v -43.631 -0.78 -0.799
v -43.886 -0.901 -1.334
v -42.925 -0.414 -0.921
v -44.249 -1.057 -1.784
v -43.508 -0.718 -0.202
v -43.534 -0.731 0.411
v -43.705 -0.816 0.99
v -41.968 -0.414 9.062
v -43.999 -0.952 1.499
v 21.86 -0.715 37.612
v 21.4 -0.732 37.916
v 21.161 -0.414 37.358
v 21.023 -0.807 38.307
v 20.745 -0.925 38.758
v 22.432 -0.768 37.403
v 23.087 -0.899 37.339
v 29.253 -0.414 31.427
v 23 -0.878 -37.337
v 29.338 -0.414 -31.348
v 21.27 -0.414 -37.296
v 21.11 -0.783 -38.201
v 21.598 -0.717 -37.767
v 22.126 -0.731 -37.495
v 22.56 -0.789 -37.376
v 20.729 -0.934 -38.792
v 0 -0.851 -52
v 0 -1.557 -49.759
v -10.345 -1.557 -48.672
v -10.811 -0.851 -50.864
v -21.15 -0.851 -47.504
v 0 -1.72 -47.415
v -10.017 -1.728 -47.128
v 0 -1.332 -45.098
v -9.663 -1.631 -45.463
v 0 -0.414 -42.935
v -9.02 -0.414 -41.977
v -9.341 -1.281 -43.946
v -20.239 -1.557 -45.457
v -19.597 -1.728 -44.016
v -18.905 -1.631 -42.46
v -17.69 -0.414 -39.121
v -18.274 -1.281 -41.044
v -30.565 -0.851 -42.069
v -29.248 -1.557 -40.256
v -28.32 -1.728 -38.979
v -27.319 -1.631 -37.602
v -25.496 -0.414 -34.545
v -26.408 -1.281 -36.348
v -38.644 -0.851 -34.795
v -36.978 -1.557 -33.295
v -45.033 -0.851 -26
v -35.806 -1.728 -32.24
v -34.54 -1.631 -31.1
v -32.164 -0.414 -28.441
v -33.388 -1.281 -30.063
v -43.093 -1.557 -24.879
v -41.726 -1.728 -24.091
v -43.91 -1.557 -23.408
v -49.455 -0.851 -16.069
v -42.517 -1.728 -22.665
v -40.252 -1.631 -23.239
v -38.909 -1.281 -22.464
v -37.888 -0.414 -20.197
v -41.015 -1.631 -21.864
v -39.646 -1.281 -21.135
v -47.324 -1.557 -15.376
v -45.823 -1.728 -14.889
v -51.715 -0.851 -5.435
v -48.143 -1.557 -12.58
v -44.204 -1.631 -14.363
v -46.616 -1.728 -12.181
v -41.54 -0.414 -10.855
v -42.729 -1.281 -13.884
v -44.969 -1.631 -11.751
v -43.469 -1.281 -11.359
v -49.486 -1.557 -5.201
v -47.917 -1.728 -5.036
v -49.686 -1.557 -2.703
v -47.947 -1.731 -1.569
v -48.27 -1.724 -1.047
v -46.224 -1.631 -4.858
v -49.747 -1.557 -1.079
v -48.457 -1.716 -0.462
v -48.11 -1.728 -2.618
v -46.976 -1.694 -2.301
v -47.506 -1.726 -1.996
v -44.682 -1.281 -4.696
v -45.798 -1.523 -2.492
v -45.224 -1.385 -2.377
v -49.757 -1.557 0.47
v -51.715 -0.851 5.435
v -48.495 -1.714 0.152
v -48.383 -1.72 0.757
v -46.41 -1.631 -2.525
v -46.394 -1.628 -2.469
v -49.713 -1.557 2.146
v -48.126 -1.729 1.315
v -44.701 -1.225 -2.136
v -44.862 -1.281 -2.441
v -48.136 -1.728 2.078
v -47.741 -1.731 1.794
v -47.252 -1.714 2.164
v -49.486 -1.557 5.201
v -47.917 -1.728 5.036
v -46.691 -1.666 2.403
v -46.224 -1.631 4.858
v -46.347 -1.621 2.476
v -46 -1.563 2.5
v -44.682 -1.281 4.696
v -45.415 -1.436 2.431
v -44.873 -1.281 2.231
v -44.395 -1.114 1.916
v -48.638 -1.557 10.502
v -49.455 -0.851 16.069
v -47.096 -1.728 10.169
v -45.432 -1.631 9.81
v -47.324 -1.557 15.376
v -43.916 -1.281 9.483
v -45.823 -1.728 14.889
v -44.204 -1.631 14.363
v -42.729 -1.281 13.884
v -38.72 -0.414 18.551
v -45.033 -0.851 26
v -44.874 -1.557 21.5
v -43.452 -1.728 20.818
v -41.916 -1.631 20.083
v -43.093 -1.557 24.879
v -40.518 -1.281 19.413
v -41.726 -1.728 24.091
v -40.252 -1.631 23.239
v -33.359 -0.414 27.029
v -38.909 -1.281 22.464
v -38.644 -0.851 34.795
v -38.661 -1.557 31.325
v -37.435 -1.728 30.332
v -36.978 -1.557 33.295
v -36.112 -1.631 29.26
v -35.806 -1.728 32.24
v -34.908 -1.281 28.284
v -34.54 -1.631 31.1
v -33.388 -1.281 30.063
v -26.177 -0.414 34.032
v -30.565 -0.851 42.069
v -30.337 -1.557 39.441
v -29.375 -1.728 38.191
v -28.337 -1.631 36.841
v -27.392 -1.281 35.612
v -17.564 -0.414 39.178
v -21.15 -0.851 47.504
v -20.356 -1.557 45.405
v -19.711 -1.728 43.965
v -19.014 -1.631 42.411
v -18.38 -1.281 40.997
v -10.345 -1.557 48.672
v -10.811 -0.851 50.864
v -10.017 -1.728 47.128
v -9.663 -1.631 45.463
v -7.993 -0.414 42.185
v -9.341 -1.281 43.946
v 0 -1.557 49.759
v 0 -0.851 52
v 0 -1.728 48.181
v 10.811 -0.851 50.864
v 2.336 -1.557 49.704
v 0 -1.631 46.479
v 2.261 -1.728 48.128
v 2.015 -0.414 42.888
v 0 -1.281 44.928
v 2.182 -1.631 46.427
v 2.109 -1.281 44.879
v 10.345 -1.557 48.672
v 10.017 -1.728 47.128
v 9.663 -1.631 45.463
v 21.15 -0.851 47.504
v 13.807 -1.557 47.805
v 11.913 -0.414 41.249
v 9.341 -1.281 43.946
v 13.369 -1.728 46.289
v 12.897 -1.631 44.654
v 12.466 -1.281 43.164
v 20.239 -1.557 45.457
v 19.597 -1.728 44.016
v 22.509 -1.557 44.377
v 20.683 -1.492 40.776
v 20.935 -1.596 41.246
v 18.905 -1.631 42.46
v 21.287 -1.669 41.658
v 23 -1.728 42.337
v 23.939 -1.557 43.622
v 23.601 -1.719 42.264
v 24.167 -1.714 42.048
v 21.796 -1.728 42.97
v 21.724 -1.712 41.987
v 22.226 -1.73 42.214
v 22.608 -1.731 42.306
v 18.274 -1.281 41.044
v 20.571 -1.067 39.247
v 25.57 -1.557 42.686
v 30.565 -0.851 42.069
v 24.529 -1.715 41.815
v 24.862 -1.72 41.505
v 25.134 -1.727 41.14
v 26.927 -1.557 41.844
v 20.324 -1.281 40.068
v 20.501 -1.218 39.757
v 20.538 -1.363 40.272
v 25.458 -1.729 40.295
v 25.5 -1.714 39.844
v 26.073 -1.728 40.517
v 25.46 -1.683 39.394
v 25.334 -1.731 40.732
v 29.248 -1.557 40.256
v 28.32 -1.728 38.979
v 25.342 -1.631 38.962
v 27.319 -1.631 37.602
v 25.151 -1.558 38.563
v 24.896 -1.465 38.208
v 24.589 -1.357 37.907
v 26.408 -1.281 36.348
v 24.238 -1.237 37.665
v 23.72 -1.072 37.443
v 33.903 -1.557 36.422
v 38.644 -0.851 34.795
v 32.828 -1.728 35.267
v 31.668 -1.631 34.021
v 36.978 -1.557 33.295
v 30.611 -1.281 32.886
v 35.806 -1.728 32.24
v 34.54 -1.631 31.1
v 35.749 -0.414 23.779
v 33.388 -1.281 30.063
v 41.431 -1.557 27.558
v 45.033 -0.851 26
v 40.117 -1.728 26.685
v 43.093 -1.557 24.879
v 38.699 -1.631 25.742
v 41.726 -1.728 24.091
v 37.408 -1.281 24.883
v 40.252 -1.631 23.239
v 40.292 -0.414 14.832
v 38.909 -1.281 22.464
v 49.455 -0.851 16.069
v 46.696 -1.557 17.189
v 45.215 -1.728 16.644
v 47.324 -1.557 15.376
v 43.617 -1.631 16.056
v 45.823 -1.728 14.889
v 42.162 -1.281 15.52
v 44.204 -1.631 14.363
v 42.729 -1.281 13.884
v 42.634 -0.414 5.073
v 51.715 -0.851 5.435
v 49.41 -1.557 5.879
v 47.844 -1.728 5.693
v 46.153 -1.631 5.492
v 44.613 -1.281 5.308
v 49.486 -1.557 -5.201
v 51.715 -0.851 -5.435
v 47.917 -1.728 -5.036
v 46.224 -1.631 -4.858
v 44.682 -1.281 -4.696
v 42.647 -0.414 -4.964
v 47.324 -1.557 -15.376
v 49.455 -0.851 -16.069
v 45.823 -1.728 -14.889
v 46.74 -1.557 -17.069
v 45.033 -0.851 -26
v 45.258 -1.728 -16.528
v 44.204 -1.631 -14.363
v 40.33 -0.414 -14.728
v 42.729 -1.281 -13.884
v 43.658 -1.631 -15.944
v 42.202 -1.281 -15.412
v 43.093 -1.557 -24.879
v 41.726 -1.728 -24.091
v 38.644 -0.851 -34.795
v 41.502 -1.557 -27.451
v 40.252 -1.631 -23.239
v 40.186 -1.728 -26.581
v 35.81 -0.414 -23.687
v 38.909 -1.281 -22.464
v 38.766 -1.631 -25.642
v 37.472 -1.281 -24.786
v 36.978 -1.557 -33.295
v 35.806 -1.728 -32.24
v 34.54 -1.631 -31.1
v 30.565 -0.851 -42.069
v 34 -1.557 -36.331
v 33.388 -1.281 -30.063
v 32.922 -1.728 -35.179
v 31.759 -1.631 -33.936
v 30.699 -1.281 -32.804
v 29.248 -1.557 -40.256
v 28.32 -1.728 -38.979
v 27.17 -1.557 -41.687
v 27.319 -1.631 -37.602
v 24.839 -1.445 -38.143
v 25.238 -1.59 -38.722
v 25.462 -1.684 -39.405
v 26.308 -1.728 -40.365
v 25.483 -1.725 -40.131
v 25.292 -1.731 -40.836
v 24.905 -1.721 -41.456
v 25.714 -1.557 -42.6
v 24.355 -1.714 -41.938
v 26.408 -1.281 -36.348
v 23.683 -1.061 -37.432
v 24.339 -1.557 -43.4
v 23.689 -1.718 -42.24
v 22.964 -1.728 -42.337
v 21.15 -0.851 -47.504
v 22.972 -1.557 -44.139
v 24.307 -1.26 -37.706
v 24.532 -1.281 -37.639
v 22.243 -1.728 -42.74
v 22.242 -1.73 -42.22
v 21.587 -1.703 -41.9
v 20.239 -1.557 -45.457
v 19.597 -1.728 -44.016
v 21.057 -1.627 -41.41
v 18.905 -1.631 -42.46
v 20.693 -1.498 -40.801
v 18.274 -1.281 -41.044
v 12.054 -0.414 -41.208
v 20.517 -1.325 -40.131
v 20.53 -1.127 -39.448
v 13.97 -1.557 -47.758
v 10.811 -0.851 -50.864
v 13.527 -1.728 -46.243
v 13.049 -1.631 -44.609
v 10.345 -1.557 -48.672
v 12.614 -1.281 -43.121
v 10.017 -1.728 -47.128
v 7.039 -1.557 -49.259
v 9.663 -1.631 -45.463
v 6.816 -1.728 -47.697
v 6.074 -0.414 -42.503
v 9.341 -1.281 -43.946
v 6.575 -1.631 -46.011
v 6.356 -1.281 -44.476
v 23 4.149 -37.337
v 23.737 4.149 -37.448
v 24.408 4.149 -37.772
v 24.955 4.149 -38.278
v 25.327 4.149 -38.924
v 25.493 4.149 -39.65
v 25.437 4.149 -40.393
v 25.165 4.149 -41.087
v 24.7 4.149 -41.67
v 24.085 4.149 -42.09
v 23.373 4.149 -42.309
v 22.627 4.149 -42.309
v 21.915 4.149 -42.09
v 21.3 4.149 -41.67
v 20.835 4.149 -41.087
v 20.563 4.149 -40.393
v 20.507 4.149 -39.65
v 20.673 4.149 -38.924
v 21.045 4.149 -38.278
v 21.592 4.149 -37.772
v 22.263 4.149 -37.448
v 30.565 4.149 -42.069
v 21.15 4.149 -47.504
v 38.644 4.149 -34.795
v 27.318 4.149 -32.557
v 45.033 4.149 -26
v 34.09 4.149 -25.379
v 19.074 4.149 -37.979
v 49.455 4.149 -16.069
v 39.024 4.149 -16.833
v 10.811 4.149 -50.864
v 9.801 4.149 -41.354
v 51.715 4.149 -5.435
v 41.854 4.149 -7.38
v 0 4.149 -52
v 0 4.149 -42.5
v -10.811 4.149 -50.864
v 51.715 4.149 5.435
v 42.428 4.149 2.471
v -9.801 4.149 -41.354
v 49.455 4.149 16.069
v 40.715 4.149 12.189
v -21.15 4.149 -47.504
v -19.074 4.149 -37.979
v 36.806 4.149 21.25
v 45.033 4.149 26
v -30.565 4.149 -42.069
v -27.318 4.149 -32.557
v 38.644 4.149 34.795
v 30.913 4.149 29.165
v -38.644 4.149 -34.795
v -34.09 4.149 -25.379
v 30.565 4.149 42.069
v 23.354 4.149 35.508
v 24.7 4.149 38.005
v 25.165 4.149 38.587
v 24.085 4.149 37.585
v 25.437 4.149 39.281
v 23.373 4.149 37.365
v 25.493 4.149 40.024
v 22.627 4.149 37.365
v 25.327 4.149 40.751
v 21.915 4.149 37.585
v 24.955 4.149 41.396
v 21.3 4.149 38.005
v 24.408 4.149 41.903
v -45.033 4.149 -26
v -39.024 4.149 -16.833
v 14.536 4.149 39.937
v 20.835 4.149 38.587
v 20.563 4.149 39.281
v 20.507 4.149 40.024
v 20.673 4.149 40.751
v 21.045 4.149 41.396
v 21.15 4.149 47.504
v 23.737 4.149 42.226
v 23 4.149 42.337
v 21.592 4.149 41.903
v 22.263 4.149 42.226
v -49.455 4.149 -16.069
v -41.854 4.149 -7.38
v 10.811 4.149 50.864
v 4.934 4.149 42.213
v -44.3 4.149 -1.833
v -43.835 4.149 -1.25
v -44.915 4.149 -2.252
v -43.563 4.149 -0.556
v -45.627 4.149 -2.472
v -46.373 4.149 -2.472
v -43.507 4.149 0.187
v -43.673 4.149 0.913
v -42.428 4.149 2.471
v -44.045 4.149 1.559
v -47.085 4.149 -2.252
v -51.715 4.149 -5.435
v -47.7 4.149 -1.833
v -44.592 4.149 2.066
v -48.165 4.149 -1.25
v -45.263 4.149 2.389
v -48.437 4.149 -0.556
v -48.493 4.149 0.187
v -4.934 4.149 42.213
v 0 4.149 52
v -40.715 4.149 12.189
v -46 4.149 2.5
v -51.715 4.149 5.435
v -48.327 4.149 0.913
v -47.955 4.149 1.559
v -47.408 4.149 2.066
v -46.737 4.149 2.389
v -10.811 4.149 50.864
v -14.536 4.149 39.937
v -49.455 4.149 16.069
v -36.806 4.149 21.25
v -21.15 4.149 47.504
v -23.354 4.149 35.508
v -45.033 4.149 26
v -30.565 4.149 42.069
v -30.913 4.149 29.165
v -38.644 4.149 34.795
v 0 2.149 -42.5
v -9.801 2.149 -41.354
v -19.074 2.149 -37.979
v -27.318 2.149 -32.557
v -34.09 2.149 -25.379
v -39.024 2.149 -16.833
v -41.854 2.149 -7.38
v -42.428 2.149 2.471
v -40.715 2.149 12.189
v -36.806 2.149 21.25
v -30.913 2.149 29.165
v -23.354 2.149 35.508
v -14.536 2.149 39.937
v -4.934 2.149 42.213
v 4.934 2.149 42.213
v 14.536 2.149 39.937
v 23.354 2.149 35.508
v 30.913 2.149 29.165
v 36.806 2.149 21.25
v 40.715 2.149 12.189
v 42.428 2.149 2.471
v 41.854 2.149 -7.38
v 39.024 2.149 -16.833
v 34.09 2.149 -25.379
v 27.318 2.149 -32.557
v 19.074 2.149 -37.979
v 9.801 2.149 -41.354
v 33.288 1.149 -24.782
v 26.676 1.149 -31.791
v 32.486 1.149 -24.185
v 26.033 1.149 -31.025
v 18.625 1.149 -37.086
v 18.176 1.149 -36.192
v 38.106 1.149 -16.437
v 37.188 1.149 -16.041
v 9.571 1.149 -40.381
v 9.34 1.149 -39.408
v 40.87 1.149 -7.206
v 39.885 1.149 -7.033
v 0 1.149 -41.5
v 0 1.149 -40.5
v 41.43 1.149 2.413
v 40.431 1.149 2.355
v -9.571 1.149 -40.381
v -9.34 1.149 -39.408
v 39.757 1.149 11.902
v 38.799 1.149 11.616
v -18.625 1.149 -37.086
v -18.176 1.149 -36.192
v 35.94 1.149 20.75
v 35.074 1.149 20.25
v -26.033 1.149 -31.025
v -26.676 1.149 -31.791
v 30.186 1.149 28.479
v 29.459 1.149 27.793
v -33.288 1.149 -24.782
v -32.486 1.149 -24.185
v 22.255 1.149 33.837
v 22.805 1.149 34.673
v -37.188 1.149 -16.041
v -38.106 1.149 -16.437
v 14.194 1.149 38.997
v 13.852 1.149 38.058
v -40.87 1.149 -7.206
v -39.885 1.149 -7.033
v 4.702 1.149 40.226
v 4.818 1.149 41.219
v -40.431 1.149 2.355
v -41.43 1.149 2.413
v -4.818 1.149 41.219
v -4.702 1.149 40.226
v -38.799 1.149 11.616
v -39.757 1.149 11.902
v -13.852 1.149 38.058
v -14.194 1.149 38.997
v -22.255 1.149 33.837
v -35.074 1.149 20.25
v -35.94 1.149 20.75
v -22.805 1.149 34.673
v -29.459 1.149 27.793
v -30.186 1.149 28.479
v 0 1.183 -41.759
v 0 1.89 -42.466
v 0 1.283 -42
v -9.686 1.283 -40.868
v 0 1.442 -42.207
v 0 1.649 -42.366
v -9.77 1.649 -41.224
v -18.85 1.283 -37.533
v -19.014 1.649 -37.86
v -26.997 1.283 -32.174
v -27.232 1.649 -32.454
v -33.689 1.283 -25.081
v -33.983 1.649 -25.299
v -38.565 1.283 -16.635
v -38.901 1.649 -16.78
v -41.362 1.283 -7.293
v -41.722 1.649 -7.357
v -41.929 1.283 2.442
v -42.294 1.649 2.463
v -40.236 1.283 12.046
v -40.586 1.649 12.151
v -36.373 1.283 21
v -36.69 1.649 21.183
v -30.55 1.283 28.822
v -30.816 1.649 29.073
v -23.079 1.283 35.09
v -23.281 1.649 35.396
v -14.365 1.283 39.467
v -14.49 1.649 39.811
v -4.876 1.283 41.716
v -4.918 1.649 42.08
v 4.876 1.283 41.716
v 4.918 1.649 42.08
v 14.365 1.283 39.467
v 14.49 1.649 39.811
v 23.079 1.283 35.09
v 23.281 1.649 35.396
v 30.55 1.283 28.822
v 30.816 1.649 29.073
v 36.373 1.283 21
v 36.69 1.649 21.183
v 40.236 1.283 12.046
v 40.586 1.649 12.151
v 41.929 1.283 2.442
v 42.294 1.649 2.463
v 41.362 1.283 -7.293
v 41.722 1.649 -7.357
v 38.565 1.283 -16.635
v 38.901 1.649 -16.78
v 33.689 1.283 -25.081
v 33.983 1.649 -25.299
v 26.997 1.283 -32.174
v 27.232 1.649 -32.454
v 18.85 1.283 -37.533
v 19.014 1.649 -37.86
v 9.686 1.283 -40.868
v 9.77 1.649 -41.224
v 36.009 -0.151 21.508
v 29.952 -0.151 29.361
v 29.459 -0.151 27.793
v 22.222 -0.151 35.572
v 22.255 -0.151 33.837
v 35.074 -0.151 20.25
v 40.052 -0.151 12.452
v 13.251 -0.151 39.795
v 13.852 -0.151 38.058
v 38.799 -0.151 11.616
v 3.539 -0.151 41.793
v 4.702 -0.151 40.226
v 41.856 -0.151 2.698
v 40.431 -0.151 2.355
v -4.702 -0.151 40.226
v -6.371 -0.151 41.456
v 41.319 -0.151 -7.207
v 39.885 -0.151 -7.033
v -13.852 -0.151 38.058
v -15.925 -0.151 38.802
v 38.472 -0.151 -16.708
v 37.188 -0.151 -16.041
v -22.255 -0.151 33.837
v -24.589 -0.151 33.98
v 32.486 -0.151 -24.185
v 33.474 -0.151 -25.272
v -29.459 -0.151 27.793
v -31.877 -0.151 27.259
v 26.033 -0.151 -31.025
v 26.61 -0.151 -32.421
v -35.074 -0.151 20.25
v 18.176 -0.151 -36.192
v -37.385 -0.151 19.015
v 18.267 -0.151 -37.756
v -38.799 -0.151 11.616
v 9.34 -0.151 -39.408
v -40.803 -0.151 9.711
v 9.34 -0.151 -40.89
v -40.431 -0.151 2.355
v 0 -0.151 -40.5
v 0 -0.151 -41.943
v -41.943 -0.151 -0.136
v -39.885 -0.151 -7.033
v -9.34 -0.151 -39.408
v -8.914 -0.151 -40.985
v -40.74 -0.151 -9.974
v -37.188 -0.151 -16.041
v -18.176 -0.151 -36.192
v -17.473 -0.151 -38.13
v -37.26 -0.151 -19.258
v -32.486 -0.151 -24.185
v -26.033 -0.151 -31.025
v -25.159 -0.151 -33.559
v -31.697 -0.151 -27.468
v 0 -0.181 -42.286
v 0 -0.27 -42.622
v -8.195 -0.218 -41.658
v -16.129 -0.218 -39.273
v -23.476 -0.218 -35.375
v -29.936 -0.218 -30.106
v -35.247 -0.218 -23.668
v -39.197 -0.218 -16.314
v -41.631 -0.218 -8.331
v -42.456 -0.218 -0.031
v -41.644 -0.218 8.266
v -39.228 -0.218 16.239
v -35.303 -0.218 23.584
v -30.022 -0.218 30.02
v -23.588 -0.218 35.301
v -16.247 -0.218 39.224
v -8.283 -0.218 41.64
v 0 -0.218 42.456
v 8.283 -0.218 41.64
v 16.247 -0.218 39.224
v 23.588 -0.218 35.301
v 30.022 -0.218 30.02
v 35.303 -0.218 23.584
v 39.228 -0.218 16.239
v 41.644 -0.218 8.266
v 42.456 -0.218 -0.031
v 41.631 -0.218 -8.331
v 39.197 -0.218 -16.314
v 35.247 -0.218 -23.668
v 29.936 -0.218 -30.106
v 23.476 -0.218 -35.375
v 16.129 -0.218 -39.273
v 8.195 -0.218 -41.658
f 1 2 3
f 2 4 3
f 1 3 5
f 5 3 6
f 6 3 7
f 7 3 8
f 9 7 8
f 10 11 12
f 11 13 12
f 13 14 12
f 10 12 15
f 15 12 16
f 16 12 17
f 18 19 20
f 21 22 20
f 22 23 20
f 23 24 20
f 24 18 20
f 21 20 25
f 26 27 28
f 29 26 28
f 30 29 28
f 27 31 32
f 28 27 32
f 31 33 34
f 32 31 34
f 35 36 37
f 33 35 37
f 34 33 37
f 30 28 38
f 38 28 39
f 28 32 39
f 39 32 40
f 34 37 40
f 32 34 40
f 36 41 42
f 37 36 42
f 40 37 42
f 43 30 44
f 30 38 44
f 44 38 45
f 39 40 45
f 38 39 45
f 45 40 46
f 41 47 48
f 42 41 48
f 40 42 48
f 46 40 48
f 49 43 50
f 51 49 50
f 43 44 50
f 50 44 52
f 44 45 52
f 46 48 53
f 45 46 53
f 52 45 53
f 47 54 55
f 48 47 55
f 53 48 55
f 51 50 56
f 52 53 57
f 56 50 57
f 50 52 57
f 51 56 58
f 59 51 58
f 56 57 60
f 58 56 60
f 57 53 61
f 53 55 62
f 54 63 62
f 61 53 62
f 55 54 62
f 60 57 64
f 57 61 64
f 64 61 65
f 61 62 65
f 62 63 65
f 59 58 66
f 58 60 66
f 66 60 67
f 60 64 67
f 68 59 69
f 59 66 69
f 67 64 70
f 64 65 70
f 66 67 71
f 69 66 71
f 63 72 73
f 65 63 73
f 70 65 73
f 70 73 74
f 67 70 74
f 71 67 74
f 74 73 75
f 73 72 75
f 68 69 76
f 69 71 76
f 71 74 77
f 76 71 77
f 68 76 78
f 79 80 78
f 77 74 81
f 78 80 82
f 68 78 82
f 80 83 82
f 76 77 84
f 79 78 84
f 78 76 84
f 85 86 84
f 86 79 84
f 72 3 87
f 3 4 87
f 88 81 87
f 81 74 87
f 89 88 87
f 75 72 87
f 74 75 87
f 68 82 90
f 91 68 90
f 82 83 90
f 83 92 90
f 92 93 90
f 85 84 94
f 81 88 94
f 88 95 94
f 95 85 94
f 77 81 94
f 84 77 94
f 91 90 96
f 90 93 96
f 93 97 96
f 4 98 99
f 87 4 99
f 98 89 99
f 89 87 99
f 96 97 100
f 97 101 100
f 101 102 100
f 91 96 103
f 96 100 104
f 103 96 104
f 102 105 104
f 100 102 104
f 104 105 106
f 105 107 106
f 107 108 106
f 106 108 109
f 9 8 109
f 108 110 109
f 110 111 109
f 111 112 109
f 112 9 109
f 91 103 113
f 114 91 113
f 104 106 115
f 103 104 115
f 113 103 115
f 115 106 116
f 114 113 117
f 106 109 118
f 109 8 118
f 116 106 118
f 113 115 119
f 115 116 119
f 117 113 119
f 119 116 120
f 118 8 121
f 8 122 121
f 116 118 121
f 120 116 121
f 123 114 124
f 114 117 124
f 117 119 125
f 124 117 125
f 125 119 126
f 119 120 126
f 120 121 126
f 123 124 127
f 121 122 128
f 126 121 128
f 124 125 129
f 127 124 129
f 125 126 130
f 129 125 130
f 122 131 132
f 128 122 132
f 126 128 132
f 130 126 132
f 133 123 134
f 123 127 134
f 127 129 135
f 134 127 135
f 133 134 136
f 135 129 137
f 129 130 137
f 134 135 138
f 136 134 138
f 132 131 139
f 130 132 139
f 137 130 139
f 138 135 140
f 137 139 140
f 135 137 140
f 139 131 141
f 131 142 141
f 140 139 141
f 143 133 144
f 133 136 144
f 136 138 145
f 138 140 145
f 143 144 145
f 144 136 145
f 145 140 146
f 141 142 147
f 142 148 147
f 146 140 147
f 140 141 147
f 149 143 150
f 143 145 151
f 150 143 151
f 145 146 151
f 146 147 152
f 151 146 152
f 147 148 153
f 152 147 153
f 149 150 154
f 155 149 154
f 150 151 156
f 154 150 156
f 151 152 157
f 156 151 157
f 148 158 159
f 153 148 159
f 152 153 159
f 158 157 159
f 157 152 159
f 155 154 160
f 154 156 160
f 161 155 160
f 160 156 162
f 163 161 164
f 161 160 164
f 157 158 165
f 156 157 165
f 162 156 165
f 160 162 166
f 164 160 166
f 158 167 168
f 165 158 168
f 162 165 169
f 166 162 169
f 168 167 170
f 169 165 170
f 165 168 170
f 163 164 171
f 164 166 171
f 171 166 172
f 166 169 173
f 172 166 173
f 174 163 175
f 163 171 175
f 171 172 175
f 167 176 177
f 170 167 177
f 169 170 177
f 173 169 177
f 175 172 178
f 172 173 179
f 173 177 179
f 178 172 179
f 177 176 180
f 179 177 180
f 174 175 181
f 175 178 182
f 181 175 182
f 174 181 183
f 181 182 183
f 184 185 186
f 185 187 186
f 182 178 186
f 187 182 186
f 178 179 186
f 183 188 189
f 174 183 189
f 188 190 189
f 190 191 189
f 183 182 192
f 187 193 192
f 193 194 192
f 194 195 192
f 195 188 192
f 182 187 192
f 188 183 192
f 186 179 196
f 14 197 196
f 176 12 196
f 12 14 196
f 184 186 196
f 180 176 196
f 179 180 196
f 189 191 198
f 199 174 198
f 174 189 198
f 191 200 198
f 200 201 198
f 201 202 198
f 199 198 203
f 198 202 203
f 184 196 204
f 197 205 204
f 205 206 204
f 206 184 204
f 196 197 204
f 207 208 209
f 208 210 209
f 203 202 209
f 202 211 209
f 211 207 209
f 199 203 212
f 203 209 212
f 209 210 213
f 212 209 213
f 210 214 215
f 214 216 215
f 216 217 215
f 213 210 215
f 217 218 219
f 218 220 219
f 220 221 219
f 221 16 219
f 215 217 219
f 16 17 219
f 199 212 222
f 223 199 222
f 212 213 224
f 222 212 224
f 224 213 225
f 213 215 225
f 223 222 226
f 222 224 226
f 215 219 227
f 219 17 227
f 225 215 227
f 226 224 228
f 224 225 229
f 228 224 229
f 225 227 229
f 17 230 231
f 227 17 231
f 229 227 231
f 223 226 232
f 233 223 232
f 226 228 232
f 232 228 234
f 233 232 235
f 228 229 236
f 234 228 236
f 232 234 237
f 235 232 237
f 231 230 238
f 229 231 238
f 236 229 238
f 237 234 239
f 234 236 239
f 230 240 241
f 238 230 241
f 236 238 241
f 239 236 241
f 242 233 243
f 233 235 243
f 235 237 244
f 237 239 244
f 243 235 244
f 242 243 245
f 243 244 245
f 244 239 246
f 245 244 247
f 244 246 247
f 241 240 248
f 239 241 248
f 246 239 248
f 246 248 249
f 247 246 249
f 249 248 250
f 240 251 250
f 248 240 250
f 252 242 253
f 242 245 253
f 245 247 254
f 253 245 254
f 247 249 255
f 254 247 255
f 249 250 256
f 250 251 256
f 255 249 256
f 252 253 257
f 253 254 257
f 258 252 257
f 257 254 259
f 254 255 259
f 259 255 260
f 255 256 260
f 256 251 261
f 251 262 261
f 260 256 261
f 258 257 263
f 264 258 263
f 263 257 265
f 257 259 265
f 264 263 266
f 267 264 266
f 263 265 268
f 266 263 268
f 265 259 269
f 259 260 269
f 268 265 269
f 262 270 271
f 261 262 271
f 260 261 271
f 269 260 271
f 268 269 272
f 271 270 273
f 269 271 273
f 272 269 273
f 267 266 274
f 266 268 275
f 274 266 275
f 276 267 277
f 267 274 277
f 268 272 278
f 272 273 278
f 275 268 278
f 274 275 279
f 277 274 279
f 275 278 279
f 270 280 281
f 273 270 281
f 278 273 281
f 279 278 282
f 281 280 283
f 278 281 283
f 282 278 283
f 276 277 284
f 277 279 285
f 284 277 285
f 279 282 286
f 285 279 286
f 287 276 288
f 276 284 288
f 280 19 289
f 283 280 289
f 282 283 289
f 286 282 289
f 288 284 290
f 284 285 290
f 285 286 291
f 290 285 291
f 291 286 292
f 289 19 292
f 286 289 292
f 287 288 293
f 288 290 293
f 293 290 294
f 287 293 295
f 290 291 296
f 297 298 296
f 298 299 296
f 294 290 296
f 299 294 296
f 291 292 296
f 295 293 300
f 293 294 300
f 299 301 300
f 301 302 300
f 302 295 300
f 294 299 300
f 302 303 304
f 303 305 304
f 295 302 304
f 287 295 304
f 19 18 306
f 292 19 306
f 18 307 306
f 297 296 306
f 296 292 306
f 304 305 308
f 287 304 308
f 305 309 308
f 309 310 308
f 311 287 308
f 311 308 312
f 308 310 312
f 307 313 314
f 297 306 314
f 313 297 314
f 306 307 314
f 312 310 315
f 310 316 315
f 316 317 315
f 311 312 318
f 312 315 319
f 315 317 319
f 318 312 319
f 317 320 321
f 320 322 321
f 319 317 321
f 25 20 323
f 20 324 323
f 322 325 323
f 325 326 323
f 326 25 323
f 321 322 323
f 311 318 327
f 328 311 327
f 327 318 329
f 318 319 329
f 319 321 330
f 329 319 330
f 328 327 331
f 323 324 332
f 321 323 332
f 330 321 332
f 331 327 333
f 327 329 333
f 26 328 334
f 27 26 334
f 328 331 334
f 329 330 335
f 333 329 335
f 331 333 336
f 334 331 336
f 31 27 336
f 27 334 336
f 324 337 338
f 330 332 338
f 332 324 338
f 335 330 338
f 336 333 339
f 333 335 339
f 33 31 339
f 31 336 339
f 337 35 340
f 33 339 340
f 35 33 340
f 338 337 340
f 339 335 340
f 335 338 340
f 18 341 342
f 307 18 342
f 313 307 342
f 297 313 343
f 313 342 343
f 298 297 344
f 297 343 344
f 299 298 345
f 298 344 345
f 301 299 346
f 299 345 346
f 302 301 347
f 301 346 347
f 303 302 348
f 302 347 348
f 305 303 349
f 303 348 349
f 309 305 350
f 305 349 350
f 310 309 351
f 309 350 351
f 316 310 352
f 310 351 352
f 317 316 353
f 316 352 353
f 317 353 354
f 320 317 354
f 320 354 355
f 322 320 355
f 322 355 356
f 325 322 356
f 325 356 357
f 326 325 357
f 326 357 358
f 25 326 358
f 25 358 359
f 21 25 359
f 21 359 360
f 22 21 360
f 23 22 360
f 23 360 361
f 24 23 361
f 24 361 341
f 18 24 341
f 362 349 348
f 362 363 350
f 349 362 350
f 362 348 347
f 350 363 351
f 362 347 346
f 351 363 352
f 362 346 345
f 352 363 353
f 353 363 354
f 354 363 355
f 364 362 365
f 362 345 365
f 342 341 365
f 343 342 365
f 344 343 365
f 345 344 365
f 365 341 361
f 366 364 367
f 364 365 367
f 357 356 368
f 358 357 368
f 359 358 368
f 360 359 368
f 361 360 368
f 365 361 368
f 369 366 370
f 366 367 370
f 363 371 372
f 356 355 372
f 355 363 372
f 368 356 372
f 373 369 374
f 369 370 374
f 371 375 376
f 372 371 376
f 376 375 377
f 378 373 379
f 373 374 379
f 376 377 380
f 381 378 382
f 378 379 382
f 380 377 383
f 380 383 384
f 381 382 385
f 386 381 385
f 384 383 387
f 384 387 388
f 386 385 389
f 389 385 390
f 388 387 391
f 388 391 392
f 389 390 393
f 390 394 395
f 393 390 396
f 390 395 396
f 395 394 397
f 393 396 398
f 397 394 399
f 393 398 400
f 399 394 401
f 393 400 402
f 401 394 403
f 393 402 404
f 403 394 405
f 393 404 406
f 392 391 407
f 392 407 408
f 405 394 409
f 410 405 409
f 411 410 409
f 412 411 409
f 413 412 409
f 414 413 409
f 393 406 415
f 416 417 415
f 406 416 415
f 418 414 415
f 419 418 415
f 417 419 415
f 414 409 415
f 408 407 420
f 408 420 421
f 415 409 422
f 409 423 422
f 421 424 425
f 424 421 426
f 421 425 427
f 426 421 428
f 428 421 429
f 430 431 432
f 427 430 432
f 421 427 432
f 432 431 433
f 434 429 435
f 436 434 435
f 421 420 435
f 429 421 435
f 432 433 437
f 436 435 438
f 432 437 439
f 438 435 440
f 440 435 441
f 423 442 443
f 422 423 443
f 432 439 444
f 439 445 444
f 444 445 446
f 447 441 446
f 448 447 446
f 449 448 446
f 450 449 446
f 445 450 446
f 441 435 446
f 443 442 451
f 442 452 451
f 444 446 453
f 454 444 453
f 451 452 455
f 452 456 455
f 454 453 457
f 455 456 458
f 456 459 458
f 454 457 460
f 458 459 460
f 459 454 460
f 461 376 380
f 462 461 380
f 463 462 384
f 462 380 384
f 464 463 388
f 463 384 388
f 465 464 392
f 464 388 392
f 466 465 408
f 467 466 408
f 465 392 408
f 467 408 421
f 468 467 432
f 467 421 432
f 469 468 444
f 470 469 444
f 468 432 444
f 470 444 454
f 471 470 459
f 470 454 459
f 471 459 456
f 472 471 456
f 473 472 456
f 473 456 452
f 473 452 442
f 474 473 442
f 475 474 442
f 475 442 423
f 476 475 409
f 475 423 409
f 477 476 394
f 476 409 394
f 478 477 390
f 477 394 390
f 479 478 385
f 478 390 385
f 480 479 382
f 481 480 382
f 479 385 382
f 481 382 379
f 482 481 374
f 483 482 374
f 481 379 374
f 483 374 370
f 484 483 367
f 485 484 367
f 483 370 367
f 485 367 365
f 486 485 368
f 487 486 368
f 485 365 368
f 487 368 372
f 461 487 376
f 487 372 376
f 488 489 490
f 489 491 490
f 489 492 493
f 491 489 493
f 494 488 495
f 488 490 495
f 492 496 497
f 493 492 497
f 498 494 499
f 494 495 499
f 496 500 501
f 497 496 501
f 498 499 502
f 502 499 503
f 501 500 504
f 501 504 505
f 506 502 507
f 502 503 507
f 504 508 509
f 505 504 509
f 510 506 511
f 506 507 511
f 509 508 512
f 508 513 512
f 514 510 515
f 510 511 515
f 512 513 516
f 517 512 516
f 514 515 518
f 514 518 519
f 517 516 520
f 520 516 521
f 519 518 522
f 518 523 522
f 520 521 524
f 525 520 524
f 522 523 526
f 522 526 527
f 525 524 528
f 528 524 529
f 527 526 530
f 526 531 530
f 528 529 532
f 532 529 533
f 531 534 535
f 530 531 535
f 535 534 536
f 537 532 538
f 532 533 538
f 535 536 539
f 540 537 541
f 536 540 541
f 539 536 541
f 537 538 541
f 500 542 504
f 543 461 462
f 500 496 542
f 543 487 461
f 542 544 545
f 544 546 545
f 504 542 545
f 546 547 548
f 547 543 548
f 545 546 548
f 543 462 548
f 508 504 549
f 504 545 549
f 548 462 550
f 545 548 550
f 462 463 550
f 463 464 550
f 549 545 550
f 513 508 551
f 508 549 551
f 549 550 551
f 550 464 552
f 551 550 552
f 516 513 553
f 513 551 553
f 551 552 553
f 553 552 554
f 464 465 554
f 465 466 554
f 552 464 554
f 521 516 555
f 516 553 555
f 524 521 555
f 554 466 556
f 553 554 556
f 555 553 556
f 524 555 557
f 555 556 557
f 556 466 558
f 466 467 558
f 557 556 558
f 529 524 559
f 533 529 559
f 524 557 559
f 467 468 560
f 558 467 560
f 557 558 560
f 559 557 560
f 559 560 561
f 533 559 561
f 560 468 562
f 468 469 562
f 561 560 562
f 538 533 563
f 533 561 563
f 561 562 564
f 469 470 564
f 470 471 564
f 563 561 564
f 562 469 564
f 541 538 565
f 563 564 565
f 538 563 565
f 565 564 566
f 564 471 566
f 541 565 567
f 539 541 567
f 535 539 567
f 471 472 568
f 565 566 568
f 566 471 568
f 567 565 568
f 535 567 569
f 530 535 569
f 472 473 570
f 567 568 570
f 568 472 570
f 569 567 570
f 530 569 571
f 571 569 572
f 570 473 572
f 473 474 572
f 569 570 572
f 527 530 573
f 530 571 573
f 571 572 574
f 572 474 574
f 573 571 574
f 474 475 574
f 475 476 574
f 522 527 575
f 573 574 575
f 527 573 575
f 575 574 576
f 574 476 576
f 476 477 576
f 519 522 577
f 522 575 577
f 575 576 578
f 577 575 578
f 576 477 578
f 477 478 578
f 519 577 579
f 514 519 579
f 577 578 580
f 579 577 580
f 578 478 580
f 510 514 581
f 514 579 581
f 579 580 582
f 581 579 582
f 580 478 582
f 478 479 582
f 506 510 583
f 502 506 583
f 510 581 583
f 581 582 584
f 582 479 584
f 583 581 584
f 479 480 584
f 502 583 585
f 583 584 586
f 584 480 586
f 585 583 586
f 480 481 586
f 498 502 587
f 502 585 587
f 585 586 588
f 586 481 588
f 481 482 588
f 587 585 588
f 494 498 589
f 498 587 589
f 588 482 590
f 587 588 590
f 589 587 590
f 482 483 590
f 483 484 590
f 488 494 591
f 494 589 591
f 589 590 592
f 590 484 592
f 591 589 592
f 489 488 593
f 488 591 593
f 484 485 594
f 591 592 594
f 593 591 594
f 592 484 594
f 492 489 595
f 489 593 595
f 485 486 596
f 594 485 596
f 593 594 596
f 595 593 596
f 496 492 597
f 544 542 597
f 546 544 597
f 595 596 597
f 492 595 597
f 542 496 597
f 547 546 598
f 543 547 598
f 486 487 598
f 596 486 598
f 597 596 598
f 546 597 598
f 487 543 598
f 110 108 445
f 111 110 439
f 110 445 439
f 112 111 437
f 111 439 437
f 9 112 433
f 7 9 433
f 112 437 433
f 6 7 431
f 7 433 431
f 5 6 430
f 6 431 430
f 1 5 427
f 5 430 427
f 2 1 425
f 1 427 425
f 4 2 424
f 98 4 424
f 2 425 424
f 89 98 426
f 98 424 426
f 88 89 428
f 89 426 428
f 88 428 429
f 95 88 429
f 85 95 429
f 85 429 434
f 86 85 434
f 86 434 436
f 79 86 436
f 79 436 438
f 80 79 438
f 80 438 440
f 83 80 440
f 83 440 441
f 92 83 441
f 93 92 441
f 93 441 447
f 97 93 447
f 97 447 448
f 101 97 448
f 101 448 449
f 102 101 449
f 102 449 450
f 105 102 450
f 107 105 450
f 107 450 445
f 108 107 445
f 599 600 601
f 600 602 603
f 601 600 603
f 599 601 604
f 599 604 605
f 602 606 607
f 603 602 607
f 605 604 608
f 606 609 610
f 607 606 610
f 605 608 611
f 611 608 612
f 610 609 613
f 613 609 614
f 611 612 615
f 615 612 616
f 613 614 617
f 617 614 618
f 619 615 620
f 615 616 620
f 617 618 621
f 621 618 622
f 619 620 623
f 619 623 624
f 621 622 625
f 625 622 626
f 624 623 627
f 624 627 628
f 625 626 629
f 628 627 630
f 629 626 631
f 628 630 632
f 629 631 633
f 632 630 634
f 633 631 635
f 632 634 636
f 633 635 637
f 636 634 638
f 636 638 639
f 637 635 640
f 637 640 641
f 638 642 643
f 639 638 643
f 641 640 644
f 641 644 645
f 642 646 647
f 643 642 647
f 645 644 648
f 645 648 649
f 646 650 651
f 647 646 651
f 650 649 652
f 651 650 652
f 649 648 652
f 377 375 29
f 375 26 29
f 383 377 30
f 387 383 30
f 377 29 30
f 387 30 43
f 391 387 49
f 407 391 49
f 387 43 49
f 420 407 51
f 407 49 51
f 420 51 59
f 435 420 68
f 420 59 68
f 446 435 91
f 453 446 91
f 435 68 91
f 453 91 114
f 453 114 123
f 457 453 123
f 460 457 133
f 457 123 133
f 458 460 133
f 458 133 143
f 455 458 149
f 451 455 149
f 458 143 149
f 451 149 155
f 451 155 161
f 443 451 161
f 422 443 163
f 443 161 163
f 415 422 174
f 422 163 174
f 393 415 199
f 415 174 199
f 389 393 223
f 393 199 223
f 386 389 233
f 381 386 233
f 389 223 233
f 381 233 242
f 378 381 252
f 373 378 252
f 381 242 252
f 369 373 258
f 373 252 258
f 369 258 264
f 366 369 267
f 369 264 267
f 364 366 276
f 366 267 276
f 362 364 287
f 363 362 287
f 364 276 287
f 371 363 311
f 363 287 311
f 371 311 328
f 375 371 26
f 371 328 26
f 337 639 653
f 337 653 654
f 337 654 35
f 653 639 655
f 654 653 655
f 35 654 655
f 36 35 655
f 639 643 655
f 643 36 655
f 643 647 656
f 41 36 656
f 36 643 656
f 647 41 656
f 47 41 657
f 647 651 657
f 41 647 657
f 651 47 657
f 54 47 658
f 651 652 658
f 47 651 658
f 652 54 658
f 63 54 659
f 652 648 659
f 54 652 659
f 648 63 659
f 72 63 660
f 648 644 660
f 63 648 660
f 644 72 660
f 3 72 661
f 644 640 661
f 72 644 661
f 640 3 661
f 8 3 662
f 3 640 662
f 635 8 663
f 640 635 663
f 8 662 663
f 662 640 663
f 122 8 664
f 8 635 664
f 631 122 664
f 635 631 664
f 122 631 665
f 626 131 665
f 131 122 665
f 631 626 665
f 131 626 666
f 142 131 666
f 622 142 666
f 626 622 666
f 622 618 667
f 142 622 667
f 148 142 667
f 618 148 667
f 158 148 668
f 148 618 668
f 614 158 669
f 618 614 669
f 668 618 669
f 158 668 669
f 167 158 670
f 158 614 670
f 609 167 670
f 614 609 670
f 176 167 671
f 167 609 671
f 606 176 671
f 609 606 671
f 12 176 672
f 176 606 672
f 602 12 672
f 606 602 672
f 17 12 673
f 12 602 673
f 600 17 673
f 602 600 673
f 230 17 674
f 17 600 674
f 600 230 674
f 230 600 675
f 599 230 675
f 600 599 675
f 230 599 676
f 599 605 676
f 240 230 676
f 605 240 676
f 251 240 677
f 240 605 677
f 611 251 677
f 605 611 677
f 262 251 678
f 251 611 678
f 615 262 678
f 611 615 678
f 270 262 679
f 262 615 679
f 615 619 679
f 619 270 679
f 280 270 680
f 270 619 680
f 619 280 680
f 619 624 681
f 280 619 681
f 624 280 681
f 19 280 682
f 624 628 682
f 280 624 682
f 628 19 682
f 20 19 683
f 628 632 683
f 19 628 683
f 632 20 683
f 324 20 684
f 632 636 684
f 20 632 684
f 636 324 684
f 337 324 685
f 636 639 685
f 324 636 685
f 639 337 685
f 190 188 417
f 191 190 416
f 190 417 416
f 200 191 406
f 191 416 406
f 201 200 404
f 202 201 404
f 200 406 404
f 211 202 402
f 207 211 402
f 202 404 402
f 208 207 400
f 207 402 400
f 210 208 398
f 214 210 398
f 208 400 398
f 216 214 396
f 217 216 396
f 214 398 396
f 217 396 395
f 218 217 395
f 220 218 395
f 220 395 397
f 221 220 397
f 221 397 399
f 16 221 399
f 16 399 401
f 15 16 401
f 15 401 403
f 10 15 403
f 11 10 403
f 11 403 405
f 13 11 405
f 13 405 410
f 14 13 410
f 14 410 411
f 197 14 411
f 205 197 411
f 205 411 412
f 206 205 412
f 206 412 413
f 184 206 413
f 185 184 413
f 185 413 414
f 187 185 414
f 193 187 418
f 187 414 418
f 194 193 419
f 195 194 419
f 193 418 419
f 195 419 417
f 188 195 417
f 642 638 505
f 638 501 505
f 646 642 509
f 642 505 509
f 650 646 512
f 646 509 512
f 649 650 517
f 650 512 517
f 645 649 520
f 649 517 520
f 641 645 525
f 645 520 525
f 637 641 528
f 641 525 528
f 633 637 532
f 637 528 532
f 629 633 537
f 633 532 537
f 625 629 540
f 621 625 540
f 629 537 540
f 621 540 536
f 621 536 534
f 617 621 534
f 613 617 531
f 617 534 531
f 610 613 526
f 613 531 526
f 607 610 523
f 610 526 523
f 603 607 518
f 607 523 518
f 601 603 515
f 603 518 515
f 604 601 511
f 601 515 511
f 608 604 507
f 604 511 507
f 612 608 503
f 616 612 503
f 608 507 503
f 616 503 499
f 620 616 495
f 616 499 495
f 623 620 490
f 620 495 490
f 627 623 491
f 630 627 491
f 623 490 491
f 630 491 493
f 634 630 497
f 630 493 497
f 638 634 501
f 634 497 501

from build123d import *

# Parameters (mm, degrees)
FILETE1_R             = 1
FILETE2_R             = 2
ESBO_O2_R             = 2.5
CORTE_EXTRUS_O1_DEPTH = 74.773875806


with BuildPart() as part:
    # Esboço1 → Revolução1 (revolve)
    with BuildSketch(Plane.XY, mode=Mode.PRIVATE) as revolu_o1_sk:
        with BuildLine():
            Line((52, 4.149133087), (52, -0.850866913))
            ThreePointArc((52, -0.850866913), (47.161295888, -1.704708432), (42.5, -0.150866913))
            Line((42.5, -0.150866913), (40.5, -0.150866913))
            Line((40.5, -0.150866913), (40.5, 1.149133087))
            Line((40.5, 1.149133087), (42.5, 1.149133087))
            Line((42.5, 1.149133087), (42.5, 4.149133087))
            Line((42.5, 4.149133087), (52, 4.149133087))
        make_face()
    revolve(revolu_o1_sk.sketch.rotate(Axis((0, -12.642652583, 0), (0, 1, 0)), 90), axis=Axis((0, -12.642652583, 0), (0, 1, 0)))

    # Filete1
    filete1_edges = [part.edges().sort_by_distance(p)[0] for p in [
        (0, 1.149133087, 42.5),
    ]]
    fillet(filete1_edges, radius=FILETE1_R)

    # Filete2
    filete2_edges = [part.edges().sort_by_distance(p)[0] for p in [
        (0, -0.150866913, 42.5),
    ]]
    fillet(filete2_edges, radius=FILETE2_R)

    # Esboço2 → Corte-extrusão1 (cut, through all)
    with BuildSketch(Plane(origin=(0, 4.149133087, 0), x_dir=(1, 0, 0), z_dir=(0, 1, 0))):
        with Locations(Location((-46, 0, 0), (0, 0, 270))):
            Circle(ESBO_O2_R)
        with Locations(Location((23, 39.837168574, 0), (0, 0, 270))):
            Circle(ESBO_O2_R)
        with Locations(Location((23, -39.837168574, 0), (0, 0, 270))):
            Circle(ESBO_O2_R)
    extrude(amount=-CORTE_EXTRUS_O1_DEPTH, mode=Mode.SUBTRACT)


solid = part.part
